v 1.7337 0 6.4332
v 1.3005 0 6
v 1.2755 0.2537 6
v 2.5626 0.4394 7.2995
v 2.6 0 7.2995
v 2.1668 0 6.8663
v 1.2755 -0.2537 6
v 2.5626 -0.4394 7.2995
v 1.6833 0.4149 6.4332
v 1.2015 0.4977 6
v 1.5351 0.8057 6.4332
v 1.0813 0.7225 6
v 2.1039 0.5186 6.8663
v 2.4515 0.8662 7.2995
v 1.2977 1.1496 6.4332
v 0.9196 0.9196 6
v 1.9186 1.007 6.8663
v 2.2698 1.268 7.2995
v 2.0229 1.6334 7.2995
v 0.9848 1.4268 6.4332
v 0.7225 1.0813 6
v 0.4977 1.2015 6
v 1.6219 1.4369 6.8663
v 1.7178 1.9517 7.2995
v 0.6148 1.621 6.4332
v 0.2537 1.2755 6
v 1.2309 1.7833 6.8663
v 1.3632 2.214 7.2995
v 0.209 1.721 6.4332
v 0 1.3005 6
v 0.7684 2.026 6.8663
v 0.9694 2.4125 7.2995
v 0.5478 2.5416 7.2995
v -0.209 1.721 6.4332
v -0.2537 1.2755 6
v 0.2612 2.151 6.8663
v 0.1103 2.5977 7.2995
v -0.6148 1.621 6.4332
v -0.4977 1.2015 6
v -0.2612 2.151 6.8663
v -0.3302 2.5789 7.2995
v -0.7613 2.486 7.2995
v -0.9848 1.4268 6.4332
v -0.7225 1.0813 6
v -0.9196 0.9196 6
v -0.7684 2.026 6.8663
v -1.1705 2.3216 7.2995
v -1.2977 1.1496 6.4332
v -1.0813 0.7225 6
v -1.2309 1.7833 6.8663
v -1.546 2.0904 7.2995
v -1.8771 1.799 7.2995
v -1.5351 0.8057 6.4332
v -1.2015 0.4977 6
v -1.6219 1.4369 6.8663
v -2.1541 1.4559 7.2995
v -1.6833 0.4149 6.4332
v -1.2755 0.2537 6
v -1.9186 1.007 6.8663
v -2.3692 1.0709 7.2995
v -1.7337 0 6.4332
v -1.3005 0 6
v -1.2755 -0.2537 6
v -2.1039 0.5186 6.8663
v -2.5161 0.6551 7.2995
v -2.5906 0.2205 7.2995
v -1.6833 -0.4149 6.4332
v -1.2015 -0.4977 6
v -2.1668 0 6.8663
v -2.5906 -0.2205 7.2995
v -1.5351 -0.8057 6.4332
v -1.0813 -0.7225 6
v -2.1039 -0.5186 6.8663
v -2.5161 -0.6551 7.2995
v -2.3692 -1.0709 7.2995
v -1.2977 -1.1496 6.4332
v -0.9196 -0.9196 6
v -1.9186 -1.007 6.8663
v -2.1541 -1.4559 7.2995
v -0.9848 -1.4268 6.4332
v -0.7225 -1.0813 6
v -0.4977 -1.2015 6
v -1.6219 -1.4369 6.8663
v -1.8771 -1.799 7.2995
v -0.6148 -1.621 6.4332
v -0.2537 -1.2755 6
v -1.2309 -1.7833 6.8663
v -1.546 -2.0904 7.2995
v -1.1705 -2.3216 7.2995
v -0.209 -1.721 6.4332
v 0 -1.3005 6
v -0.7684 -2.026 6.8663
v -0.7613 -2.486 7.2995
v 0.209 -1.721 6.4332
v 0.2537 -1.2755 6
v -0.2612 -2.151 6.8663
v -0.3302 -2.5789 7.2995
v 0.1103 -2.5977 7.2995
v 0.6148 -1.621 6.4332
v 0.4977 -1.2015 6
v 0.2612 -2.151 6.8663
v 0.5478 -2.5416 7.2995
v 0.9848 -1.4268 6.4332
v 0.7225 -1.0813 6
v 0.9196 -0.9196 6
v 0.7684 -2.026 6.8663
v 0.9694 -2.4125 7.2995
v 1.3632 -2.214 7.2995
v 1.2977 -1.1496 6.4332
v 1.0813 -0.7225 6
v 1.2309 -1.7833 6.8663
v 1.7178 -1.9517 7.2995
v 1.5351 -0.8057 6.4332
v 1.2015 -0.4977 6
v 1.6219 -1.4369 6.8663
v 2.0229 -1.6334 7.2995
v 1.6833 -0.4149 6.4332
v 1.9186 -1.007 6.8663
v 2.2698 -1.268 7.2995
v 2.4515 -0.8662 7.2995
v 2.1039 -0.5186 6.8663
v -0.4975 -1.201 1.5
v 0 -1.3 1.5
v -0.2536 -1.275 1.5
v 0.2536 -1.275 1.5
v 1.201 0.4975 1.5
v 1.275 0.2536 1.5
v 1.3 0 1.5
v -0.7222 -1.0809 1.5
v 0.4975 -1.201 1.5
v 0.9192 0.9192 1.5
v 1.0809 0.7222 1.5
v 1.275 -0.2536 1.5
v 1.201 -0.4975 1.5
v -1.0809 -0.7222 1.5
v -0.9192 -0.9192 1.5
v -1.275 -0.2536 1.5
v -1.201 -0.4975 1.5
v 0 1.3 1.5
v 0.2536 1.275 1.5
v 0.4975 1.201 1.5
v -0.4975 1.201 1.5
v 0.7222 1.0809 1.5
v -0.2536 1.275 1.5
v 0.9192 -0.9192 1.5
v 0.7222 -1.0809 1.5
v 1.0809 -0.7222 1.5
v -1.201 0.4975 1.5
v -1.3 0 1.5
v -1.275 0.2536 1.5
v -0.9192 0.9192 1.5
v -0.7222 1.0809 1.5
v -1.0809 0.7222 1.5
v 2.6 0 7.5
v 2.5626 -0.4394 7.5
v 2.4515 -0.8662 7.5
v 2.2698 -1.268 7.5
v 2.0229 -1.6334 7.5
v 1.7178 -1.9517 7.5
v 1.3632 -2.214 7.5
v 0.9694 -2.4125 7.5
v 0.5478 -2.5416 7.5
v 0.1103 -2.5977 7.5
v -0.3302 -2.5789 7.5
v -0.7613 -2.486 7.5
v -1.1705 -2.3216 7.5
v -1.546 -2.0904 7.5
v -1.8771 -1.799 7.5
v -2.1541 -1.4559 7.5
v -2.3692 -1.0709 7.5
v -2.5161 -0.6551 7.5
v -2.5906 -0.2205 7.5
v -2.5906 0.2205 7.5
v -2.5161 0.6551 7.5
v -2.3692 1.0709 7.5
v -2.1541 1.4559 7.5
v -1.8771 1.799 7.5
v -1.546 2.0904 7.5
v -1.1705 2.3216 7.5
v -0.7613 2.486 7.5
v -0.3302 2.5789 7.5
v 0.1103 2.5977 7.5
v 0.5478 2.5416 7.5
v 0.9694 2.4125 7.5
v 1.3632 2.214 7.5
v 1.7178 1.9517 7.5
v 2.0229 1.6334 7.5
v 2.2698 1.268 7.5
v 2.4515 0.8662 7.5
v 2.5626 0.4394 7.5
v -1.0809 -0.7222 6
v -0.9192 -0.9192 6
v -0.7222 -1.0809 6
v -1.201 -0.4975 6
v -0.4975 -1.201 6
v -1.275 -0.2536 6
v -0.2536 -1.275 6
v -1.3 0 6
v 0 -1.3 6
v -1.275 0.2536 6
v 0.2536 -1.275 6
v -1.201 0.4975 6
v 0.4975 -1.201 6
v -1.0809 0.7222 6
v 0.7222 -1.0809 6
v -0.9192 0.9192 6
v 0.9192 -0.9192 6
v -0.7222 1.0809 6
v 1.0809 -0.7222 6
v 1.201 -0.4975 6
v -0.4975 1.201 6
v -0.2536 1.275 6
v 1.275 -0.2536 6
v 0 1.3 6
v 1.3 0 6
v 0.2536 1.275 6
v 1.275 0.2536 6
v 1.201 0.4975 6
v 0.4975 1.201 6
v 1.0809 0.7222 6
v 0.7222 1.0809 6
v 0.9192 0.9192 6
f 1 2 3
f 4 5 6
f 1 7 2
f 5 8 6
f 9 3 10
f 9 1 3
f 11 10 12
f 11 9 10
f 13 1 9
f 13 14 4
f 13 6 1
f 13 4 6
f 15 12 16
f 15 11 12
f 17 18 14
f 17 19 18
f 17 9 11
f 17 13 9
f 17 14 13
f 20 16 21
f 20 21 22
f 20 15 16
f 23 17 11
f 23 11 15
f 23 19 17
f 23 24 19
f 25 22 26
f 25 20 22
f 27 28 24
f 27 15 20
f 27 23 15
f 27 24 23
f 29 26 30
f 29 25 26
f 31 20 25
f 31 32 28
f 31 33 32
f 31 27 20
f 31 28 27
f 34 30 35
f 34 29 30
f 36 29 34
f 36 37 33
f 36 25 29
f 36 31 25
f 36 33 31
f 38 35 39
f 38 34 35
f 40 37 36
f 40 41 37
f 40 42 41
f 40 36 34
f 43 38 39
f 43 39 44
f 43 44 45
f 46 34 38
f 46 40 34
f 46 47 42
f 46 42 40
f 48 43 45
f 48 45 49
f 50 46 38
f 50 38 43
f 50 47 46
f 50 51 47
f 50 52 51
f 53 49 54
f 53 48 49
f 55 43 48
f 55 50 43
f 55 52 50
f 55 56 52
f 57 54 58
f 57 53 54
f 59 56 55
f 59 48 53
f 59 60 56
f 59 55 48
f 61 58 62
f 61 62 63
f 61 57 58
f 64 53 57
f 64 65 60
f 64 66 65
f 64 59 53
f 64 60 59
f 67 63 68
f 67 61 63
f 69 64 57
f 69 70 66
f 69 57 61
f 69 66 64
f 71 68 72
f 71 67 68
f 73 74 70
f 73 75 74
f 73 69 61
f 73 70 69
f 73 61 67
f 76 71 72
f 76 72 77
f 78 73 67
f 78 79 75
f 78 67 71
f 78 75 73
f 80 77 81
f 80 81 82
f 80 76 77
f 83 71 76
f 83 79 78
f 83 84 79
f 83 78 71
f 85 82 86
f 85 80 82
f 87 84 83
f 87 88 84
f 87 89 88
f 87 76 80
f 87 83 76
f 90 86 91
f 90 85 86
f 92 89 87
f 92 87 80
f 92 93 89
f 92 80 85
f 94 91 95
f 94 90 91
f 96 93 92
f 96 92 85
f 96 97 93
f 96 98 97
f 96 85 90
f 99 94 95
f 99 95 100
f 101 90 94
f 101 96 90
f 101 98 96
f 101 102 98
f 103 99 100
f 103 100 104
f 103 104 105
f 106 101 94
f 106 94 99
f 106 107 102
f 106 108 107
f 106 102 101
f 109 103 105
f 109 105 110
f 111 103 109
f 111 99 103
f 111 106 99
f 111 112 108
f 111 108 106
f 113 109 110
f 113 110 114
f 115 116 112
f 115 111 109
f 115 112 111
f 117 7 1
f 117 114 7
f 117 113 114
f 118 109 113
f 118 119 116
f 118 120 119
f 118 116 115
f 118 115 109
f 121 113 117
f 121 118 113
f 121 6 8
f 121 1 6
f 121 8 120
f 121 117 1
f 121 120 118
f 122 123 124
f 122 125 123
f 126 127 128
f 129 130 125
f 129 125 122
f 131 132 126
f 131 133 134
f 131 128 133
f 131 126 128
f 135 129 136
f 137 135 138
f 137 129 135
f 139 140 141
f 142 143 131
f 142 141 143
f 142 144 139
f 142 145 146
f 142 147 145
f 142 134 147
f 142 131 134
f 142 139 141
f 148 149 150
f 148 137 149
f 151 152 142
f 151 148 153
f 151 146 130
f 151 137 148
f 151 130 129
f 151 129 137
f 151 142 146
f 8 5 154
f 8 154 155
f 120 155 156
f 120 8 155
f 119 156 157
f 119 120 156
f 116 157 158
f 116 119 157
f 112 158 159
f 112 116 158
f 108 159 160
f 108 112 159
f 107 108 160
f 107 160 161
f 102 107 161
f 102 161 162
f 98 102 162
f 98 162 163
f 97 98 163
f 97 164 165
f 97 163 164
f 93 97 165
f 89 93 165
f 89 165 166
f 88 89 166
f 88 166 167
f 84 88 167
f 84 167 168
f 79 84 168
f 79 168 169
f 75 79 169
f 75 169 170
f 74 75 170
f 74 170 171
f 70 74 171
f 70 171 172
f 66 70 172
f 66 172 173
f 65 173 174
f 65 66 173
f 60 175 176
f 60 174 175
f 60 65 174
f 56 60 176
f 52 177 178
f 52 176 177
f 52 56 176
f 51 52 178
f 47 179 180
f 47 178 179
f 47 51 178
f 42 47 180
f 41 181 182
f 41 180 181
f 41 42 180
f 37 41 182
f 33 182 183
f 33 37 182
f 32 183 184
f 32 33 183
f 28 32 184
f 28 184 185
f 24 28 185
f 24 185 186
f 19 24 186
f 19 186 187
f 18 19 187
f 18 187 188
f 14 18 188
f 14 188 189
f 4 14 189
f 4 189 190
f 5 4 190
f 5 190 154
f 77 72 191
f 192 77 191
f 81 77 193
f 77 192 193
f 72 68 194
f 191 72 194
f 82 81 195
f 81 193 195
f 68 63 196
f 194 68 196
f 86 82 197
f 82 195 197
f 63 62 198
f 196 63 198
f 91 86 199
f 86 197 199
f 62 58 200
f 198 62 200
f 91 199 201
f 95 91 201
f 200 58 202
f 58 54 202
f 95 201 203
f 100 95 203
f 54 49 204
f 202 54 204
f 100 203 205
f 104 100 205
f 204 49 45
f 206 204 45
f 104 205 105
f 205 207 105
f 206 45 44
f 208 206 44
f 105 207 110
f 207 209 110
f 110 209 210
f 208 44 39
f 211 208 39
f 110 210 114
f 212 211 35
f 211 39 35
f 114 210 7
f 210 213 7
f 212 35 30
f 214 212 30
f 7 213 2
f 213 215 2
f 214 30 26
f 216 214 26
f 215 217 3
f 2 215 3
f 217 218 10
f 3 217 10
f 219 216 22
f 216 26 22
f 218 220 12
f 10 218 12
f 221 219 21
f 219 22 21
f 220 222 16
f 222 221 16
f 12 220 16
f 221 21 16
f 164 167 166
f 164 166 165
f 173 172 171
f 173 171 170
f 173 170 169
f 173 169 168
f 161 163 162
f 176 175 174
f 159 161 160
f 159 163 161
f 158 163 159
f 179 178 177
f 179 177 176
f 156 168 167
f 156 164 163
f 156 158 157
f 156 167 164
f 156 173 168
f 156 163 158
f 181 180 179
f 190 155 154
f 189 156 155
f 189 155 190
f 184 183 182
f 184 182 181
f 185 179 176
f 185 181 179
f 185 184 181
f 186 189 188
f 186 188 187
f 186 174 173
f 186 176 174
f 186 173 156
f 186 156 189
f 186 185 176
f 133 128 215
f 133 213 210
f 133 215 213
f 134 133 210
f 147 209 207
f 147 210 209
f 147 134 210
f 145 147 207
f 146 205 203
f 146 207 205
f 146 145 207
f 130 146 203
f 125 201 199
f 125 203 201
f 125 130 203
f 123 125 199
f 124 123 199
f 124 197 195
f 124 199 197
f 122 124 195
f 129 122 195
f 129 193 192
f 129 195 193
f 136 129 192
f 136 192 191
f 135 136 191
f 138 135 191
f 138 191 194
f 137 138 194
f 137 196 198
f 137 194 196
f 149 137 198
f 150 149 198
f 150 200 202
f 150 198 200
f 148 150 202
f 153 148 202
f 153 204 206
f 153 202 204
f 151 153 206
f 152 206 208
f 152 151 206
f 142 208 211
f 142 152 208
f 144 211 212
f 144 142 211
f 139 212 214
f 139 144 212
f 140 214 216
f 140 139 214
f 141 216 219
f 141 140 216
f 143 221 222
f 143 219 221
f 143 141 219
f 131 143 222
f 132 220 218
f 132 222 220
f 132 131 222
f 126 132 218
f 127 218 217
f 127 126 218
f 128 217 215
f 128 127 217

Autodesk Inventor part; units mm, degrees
ref_plane "YZ Plane" through (0, 0, 0) normal (1, 0, 0) x (0, 1, 0)
ref_plane "XZ Plane" through (0, 0, 0) normal (0, 1, 0) x (-1, 0, 0)
ref_plane "XY Plane" through (0, 0, 0) normal (0, 0, 1) x (1, 0, 0)
sketch "スケッチ1" plane through (0, 0, 0) normal (0, 0, 1) x (1, 0, 0)
  circle A0 centre (0, 0) radius 1.3
  dimension "d0" = 2.6
extrude "押し出し1" add sketch "スケッチ1" along normal blind 6
sketch "スケッチ2" plane through (0, 0, 6) normal (0, 0, 1) x (1, 0, 0)
  circle A0 centre (0, 0) radius 1.3 projected
  circle A1 centre (0, 0) radius 2.6
  dimension "d3" = 5.2
extrude "押し出し2" add sketch "スケッチ2" along normal blind 1.5 contours A0 | A1
thread "ねじ1" size "M3x0.5" class "6g" standard "ANSI Metric M Profile" full length
chamfer "面取り1" distance 1.3 angle 45 1 edges at (-2.6, 0, 6)
sketch "スケッチ4" plane through (0, 0, 0) normal (0, 0, -1) x (-1, 0, 0)
  circle A0 centre (0, 0) radius 1.3 projected
extrude "押し出し4" cut sketch "スケッチ4" against normal blind 1.5
properties part number "M2.6 6mm皿ネジ" material "Steel, Mild"
